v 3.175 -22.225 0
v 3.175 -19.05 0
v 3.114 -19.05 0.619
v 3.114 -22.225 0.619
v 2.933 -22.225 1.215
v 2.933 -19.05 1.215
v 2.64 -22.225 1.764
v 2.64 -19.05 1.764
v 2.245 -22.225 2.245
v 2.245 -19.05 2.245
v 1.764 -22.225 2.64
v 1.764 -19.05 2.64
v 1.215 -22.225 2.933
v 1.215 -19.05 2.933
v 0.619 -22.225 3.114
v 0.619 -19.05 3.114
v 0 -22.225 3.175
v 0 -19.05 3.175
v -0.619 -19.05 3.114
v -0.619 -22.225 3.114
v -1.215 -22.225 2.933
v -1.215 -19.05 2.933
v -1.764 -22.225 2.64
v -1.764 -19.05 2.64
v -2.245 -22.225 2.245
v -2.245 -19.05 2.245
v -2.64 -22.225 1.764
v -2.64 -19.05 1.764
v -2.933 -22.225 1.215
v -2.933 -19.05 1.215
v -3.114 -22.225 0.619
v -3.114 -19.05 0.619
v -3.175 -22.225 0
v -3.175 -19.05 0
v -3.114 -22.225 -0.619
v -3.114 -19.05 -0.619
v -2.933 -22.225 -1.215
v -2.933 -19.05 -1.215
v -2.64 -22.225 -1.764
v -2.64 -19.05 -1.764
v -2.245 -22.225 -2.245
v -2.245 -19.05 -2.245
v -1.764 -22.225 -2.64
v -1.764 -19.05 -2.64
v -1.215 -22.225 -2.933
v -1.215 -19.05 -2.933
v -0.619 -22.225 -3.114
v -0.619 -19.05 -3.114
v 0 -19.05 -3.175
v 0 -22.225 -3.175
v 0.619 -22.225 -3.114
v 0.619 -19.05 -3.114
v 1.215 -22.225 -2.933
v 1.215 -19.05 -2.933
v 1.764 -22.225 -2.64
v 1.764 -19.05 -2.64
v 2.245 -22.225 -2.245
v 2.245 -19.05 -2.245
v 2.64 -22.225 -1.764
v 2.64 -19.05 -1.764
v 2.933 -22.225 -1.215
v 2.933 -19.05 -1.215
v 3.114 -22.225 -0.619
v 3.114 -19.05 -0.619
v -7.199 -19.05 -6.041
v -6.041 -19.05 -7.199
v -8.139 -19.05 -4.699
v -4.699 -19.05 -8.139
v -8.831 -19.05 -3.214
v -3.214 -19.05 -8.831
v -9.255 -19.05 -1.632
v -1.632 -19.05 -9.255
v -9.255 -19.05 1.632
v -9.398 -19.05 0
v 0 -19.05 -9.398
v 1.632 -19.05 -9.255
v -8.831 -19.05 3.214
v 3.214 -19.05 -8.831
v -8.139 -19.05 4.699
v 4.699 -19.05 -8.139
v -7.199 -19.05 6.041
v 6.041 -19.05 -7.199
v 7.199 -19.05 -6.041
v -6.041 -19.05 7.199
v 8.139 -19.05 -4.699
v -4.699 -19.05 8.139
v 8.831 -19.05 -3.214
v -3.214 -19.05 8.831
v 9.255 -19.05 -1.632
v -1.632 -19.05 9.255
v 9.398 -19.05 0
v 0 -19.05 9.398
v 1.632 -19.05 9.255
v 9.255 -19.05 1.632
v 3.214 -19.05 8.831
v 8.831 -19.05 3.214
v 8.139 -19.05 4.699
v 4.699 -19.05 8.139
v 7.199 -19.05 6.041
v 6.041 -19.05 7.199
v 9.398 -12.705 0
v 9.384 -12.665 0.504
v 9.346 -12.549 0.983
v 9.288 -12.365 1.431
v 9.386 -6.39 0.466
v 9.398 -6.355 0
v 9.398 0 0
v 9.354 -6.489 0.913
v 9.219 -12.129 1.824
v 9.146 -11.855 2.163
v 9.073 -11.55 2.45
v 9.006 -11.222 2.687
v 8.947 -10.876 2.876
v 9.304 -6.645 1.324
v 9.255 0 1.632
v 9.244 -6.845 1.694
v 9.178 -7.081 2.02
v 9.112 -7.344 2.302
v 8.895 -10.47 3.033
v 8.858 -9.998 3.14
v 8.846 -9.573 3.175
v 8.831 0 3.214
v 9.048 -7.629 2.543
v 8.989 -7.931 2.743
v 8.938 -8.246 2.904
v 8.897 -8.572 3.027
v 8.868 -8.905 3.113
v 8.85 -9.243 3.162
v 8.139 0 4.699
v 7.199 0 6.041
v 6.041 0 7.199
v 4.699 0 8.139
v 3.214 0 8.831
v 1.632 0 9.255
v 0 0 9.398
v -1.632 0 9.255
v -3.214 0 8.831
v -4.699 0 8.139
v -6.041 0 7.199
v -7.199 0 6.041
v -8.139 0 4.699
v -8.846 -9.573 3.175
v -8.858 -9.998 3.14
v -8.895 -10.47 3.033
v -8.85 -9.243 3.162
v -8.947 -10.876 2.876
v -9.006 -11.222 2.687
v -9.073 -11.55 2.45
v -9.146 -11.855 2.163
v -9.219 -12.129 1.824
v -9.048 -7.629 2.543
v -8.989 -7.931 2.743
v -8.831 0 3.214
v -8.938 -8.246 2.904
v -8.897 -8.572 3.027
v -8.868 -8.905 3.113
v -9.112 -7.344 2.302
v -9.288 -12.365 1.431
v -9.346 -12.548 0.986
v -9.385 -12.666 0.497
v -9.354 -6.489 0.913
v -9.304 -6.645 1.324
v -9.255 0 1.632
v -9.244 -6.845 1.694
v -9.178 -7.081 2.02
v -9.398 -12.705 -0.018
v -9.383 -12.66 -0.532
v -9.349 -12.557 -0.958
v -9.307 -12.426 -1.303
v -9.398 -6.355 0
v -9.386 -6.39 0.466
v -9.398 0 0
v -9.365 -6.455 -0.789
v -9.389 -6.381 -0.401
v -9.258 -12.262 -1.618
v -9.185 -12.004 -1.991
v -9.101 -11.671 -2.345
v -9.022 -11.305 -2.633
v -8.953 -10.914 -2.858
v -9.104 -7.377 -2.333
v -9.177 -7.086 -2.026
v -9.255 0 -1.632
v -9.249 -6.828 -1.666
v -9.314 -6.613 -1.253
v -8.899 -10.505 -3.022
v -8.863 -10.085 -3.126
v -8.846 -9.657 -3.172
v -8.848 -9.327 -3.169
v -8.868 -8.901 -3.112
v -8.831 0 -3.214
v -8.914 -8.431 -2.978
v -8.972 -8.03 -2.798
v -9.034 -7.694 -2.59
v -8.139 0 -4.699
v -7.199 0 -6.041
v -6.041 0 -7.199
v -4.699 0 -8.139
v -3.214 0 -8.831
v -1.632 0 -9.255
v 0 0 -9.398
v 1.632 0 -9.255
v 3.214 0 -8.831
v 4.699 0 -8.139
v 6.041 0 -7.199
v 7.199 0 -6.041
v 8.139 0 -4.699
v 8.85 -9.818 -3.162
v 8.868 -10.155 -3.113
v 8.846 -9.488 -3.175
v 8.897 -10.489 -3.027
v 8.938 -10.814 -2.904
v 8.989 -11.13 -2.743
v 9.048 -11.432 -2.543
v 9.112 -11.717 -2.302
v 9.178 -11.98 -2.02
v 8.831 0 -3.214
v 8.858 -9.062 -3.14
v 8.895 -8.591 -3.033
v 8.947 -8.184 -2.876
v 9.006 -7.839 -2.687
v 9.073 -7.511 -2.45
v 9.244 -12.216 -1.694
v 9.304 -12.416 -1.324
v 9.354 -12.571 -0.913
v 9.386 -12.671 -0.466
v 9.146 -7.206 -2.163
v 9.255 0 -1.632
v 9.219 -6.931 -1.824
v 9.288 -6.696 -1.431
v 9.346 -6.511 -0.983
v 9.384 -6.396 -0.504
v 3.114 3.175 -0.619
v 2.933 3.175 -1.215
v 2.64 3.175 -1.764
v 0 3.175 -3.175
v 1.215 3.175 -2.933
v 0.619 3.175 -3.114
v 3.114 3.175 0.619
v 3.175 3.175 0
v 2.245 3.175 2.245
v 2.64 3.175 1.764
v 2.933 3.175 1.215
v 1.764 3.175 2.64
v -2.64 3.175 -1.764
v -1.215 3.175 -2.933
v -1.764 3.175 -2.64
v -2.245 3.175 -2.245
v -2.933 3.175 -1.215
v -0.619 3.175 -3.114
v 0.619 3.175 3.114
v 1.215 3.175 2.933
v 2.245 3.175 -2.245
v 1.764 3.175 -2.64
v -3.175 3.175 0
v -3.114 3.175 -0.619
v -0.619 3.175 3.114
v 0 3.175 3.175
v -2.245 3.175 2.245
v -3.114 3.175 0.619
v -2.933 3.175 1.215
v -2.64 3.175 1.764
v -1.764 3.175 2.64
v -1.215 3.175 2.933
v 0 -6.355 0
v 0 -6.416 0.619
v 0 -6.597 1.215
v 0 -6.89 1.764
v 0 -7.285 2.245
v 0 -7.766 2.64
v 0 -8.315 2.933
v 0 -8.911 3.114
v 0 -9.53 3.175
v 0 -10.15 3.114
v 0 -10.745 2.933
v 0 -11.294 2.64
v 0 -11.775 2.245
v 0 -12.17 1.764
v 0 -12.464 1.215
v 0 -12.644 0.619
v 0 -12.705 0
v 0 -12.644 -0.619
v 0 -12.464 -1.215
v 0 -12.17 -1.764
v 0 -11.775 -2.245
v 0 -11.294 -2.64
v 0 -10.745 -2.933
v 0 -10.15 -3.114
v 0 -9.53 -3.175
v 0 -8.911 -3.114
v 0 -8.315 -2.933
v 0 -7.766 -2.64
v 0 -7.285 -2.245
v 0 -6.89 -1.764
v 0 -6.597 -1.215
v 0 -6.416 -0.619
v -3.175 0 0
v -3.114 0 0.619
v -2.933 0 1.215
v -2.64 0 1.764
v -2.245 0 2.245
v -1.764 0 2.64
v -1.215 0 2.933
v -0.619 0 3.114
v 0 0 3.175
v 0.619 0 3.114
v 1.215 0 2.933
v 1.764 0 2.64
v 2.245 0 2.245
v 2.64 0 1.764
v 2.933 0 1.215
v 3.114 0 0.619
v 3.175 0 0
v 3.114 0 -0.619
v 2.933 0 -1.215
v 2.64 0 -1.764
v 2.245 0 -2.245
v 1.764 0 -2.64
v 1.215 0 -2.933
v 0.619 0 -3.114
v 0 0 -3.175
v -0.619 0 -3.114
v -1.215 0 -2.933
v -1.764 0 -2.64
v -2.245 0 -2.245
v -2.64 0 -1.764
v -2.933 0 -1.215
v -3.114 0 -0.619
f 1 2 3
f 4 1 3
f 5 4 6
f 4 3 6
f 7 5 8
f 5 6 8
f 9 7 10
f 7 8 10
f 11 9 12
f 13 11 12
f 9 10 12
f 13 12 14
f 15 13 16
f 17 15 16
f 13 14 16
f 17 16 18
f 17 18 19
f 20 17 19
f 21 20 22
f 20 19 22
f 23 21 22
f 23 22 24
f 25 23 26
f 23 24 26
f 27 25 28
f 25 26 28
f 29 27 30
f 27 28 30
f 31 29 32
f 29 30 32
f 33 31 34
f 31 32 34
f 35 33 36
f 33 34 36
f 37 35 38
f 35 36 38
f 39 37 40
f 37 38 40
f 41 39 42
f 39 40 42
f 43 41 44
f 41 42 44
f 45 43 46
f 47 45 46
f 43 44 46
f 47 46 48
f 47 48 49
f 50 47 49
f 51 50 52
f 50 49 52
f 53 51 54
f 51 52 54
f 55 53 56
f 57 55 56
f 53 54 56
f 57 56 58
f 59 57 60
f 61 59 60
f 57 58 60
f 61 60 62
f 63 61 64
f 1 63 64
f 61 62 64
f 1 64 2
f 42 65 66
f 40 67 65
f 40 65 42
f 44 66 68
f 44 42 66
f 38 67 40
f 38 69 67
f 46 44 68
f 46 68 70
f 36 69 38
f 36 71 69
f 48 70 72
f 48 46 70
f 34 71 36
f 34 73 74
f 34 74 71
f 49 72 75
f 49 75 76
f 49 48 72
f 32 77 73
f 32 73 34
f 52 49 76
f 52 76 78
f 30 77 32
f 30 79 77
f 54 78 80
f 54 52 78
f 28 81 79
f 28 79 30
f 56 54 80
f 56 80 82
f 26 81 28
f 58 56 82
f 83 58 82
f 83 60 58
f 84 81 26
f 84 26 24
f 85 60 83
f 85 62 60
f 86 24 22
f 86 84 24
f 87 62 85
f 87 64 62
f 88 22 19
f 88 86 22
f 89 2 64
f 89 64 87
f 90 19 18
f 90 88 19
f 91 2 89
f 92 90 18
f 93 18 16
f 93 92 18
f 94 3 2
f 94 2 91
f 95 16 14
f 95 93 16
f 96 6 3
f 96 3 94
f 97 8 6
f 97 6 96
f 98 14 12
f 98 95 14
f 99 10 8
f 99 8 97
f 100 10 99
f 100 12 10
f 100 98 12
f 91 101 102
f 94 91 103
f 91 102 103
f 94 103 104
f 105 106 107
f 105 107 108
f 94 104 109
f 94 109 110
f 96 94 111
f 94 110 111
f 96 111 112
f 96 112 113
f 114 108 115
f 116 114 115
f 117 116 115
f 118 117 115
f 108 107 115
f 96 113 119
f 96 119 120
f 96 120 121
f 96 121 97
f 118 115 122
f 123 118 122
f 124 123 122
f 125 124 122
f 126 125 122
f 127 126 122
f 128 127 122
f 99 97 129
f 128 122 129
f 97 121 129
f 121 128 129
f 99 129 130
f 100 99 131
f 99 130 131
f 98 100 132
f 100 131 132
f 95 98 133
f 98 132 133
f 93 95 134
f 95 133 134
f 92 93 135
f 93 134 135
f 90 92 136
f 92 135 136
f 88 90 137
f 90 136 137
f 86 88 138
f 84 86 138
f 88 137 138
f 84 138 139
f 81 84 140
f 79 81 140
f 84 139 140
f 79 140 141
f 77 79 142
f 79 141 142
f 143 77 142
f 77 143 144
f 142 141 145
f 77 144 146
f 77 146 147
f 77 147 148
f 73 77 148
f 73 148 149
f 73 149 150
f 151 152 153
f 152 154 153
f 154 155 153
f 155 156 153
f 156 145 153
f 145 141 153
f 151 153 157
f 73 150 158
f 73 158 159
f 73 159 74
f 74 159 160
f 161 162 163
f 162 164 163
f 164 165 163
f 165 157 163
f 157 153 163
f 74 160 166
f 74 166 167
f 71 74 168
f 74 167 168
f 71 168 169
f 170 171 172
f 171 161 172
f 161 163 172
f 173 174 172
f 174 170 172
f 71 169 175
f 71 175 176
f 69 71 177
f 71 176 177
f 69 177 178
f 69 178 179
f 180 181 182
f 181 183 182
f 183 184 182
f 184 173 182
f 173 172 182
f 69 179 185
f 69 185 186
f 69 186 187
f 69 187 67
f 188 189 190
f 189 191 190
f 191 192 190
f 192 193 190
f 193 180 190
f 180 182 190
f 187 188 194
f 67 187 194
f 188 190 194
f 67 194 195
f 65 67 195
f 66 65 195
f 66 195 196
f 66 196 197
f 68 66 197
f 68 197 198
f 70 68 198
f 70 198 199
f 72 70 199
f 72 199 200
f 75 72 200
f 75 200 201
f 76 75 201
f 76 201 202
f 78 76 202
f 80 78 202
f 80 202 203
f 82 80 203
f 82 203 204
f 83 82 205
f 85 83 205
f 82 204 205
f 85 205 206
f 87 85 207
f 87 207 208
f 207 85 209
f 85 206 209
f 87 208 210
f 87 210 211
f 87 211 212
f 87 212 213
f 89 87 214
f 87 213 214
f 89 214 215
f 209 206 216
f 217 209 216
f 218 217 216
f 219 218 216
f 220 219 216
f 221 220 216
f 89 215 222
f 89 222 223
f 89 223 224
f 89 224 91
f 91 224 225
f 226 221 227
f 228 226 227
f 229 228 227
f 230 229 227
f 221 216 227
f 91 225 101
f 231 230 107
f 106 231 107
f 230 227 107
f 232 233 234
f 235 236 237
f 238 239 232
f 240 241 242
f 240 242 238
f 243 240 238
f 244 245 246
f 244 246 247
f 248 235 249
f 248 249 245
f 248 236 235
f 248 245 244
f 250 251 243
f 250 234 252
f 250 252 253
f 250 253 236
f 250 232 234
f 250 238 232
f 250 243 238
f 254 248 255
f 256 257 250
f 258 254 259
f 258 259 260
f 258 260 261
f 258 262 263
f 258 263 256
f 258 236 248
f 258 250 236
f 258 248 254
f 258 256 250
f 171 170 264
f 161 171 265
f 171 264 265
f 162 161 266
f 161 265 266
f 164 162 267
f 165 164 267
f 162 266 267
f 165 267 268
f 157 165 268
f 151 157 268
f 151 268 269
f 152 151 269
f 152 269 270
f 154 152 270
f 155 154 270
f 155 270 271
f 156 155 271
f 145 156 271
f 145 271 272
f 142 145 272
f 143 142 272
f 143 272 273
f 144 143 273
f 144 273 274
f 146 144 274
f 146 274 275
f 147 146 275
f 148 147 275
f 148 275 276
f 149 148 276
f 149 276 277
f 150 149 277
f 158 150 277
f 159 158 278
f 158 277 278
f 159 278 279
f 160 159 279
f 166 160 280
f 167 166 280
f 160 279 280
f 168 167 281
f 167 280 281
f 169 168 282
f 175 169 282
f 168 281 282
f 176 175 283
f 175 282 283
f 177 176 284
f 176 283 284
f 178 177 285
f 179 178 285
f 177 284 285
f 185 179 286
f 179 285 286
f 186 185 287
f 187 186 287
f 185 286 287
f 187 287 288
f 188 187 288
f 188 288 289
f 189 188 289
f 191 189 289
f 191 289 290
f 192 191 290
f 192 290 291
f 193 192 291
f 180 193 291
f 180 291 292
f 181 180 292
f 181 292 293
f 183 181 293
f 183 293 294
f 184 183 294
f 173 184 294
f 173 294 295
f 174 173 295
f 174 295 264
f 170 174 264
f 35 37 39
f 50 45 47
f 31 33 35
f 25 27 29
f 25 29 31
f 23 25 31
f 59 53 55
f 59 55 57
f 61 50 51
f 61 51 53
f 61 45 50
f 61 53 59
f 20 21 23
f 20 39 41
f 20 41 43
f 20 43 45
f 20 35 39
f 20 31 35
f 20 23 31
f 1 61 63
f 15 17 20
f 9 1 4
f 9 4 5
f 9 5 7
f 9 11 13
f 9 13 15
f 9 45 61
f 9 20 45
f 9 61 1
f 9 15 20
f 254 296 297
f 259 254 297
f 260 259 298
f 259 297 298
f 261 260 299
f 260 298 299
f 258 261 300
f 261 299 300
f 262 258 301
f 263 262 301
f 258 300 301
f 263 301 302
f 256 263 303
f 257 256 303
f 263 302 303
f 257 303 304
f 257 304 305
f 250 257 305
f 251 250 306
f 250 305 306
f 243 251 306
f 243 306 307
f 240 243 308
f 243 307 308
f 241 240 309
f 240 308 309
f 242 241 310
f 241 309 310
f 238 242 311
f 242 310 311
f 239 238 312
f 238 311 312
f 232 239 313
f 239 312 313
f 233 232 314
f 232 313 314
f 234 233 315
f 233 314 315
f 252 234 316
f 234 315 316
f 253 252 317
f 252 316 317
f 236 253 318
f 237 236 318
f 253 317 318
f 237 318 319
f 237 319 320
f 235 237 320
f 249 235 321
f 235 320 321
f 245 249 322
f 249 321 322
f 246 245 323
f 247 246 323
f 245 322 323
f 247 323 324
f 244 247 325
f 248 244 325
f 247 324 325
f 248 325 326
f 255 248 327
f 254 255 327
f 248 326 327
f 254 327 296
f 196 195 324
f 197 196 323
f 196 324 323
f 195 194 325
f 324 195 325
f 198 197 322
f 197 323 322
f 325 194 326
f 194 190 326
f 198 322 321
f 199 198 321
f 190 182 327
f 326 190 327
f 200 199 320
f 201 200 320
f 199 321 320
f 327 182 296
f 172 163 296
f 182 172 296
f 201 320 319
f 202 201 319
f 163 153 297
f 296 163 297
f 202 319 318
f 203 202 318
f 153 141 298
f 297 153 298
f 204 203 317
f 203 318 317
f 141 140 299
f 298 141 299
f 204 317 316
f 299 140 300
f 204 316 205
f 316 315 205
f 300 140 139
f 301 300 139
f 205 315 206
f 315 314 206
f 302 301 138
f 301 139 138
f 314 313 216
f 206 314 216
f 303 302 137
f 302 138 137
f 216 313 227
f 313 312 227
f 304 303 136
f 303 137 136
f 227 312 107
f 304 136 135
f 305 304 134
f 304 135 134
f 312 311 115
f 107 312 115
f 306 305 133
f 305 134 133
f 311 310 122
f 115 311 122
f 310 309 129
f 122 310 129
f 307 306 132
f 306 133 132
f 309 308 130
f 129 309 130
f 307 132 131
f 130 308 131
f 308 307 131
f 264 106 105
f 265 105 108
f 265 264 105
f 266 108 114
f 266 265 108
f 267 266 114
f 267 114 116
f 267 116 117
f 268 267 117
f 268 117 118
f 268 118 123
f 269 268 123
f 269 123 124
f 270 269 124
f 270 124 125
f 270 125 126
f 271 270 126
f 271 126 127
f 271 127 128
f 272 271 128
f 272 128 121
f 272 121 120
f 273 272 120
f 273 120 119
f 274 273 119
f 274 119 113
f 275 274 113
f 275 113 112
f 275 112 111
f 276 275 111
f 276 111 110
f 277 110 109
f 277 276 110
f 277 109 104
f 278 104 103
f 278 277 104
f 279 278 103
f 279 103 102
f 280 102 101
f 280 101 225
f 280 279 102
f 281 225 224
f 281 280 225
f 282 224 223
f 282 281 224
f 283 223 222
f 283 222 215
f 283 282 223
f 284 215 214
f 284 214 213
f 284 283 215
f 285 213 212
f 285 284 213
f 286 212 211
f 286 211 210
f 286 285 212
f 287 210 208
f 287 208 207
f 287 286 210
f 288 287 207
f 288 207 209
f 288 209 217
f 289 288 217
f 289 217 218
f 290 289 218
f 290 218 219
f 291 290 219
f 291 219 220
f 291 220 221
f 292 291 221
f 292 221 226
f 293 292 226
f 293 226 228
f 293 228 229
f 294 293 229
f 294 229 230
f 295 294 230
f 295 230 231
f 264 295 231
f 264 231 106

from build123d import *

# Parameters (mm, degrees)
F0_R           = 9.398
F1_DEPTH       = 19.05
F2_R           = 3.175
F3_DEPTH       = 3.175
F4_R           = 3.175
F5_DEPTH       = 3.175
F6_R           = 3.175
F7_DEPTH       = 127
F10_DEPTH      = 25.4
F11_DEPTH      = 25.4
F11_DEPTH_BACK = 25.4


# Not quite as in the source:
# - a feature of the source that left no trace in its solid (it failed there, or was rolled back) is left out


with BuildPart() as f1:
    # F0 (on Front) → F1 (new body)
    with BuildSketch(Plane.XZ):
        Circle(F0_R)
    extrude(amount=F1_DEPTH)

    # F2 (on face) → F3 (join)
    with BuildSketch(Plane.XZ.offset(19.05)):
        Circle(F2_R)
    extrude(amount=F3_DEPTH)

    # F4 (on face) → F5 (join)
    with BuildSketch(Plane(origin=(0, 0, 0), x_dir=(-1, 0, 0), z_dir=(0, 1, 0))):
        Circle(F4_R)
    extrude(amount=F5_DEPTH)

    # F6 (on Right) → F7 (cut)
    with BuildSketch(Plane.YZ):
        with Locations((-9.5303244889, 0)):
            Circle(F6_R)
    extrude(amount=-F7_DEPTH, mode=Mode.SUBTRACT)

    # F6 (on Right) → F10 (cut)
    with BuildSketch(Plane.YZ):
        with Locations((-9.5303244889, 0)):
            Circle(F6_R)
    extrude(amount=-F10_DEPTH, mode=Mode.SUBTRACT)

    # F6 (on Right) → F11 (cut, two sides)
    with BuildSketch(Plane.YZ) as f11_sk:
        with Locations((-9.5303244889, 0)):
            Circle(F6_R)
    extrude(amount=-F11_DEPTH, mode=Mode.SUBTRACT)
    extrude(f11_sk.sketch, amount=F11_DEPTH_BACK, mode=Mode.SUBTRACT)


solid = f1.part
